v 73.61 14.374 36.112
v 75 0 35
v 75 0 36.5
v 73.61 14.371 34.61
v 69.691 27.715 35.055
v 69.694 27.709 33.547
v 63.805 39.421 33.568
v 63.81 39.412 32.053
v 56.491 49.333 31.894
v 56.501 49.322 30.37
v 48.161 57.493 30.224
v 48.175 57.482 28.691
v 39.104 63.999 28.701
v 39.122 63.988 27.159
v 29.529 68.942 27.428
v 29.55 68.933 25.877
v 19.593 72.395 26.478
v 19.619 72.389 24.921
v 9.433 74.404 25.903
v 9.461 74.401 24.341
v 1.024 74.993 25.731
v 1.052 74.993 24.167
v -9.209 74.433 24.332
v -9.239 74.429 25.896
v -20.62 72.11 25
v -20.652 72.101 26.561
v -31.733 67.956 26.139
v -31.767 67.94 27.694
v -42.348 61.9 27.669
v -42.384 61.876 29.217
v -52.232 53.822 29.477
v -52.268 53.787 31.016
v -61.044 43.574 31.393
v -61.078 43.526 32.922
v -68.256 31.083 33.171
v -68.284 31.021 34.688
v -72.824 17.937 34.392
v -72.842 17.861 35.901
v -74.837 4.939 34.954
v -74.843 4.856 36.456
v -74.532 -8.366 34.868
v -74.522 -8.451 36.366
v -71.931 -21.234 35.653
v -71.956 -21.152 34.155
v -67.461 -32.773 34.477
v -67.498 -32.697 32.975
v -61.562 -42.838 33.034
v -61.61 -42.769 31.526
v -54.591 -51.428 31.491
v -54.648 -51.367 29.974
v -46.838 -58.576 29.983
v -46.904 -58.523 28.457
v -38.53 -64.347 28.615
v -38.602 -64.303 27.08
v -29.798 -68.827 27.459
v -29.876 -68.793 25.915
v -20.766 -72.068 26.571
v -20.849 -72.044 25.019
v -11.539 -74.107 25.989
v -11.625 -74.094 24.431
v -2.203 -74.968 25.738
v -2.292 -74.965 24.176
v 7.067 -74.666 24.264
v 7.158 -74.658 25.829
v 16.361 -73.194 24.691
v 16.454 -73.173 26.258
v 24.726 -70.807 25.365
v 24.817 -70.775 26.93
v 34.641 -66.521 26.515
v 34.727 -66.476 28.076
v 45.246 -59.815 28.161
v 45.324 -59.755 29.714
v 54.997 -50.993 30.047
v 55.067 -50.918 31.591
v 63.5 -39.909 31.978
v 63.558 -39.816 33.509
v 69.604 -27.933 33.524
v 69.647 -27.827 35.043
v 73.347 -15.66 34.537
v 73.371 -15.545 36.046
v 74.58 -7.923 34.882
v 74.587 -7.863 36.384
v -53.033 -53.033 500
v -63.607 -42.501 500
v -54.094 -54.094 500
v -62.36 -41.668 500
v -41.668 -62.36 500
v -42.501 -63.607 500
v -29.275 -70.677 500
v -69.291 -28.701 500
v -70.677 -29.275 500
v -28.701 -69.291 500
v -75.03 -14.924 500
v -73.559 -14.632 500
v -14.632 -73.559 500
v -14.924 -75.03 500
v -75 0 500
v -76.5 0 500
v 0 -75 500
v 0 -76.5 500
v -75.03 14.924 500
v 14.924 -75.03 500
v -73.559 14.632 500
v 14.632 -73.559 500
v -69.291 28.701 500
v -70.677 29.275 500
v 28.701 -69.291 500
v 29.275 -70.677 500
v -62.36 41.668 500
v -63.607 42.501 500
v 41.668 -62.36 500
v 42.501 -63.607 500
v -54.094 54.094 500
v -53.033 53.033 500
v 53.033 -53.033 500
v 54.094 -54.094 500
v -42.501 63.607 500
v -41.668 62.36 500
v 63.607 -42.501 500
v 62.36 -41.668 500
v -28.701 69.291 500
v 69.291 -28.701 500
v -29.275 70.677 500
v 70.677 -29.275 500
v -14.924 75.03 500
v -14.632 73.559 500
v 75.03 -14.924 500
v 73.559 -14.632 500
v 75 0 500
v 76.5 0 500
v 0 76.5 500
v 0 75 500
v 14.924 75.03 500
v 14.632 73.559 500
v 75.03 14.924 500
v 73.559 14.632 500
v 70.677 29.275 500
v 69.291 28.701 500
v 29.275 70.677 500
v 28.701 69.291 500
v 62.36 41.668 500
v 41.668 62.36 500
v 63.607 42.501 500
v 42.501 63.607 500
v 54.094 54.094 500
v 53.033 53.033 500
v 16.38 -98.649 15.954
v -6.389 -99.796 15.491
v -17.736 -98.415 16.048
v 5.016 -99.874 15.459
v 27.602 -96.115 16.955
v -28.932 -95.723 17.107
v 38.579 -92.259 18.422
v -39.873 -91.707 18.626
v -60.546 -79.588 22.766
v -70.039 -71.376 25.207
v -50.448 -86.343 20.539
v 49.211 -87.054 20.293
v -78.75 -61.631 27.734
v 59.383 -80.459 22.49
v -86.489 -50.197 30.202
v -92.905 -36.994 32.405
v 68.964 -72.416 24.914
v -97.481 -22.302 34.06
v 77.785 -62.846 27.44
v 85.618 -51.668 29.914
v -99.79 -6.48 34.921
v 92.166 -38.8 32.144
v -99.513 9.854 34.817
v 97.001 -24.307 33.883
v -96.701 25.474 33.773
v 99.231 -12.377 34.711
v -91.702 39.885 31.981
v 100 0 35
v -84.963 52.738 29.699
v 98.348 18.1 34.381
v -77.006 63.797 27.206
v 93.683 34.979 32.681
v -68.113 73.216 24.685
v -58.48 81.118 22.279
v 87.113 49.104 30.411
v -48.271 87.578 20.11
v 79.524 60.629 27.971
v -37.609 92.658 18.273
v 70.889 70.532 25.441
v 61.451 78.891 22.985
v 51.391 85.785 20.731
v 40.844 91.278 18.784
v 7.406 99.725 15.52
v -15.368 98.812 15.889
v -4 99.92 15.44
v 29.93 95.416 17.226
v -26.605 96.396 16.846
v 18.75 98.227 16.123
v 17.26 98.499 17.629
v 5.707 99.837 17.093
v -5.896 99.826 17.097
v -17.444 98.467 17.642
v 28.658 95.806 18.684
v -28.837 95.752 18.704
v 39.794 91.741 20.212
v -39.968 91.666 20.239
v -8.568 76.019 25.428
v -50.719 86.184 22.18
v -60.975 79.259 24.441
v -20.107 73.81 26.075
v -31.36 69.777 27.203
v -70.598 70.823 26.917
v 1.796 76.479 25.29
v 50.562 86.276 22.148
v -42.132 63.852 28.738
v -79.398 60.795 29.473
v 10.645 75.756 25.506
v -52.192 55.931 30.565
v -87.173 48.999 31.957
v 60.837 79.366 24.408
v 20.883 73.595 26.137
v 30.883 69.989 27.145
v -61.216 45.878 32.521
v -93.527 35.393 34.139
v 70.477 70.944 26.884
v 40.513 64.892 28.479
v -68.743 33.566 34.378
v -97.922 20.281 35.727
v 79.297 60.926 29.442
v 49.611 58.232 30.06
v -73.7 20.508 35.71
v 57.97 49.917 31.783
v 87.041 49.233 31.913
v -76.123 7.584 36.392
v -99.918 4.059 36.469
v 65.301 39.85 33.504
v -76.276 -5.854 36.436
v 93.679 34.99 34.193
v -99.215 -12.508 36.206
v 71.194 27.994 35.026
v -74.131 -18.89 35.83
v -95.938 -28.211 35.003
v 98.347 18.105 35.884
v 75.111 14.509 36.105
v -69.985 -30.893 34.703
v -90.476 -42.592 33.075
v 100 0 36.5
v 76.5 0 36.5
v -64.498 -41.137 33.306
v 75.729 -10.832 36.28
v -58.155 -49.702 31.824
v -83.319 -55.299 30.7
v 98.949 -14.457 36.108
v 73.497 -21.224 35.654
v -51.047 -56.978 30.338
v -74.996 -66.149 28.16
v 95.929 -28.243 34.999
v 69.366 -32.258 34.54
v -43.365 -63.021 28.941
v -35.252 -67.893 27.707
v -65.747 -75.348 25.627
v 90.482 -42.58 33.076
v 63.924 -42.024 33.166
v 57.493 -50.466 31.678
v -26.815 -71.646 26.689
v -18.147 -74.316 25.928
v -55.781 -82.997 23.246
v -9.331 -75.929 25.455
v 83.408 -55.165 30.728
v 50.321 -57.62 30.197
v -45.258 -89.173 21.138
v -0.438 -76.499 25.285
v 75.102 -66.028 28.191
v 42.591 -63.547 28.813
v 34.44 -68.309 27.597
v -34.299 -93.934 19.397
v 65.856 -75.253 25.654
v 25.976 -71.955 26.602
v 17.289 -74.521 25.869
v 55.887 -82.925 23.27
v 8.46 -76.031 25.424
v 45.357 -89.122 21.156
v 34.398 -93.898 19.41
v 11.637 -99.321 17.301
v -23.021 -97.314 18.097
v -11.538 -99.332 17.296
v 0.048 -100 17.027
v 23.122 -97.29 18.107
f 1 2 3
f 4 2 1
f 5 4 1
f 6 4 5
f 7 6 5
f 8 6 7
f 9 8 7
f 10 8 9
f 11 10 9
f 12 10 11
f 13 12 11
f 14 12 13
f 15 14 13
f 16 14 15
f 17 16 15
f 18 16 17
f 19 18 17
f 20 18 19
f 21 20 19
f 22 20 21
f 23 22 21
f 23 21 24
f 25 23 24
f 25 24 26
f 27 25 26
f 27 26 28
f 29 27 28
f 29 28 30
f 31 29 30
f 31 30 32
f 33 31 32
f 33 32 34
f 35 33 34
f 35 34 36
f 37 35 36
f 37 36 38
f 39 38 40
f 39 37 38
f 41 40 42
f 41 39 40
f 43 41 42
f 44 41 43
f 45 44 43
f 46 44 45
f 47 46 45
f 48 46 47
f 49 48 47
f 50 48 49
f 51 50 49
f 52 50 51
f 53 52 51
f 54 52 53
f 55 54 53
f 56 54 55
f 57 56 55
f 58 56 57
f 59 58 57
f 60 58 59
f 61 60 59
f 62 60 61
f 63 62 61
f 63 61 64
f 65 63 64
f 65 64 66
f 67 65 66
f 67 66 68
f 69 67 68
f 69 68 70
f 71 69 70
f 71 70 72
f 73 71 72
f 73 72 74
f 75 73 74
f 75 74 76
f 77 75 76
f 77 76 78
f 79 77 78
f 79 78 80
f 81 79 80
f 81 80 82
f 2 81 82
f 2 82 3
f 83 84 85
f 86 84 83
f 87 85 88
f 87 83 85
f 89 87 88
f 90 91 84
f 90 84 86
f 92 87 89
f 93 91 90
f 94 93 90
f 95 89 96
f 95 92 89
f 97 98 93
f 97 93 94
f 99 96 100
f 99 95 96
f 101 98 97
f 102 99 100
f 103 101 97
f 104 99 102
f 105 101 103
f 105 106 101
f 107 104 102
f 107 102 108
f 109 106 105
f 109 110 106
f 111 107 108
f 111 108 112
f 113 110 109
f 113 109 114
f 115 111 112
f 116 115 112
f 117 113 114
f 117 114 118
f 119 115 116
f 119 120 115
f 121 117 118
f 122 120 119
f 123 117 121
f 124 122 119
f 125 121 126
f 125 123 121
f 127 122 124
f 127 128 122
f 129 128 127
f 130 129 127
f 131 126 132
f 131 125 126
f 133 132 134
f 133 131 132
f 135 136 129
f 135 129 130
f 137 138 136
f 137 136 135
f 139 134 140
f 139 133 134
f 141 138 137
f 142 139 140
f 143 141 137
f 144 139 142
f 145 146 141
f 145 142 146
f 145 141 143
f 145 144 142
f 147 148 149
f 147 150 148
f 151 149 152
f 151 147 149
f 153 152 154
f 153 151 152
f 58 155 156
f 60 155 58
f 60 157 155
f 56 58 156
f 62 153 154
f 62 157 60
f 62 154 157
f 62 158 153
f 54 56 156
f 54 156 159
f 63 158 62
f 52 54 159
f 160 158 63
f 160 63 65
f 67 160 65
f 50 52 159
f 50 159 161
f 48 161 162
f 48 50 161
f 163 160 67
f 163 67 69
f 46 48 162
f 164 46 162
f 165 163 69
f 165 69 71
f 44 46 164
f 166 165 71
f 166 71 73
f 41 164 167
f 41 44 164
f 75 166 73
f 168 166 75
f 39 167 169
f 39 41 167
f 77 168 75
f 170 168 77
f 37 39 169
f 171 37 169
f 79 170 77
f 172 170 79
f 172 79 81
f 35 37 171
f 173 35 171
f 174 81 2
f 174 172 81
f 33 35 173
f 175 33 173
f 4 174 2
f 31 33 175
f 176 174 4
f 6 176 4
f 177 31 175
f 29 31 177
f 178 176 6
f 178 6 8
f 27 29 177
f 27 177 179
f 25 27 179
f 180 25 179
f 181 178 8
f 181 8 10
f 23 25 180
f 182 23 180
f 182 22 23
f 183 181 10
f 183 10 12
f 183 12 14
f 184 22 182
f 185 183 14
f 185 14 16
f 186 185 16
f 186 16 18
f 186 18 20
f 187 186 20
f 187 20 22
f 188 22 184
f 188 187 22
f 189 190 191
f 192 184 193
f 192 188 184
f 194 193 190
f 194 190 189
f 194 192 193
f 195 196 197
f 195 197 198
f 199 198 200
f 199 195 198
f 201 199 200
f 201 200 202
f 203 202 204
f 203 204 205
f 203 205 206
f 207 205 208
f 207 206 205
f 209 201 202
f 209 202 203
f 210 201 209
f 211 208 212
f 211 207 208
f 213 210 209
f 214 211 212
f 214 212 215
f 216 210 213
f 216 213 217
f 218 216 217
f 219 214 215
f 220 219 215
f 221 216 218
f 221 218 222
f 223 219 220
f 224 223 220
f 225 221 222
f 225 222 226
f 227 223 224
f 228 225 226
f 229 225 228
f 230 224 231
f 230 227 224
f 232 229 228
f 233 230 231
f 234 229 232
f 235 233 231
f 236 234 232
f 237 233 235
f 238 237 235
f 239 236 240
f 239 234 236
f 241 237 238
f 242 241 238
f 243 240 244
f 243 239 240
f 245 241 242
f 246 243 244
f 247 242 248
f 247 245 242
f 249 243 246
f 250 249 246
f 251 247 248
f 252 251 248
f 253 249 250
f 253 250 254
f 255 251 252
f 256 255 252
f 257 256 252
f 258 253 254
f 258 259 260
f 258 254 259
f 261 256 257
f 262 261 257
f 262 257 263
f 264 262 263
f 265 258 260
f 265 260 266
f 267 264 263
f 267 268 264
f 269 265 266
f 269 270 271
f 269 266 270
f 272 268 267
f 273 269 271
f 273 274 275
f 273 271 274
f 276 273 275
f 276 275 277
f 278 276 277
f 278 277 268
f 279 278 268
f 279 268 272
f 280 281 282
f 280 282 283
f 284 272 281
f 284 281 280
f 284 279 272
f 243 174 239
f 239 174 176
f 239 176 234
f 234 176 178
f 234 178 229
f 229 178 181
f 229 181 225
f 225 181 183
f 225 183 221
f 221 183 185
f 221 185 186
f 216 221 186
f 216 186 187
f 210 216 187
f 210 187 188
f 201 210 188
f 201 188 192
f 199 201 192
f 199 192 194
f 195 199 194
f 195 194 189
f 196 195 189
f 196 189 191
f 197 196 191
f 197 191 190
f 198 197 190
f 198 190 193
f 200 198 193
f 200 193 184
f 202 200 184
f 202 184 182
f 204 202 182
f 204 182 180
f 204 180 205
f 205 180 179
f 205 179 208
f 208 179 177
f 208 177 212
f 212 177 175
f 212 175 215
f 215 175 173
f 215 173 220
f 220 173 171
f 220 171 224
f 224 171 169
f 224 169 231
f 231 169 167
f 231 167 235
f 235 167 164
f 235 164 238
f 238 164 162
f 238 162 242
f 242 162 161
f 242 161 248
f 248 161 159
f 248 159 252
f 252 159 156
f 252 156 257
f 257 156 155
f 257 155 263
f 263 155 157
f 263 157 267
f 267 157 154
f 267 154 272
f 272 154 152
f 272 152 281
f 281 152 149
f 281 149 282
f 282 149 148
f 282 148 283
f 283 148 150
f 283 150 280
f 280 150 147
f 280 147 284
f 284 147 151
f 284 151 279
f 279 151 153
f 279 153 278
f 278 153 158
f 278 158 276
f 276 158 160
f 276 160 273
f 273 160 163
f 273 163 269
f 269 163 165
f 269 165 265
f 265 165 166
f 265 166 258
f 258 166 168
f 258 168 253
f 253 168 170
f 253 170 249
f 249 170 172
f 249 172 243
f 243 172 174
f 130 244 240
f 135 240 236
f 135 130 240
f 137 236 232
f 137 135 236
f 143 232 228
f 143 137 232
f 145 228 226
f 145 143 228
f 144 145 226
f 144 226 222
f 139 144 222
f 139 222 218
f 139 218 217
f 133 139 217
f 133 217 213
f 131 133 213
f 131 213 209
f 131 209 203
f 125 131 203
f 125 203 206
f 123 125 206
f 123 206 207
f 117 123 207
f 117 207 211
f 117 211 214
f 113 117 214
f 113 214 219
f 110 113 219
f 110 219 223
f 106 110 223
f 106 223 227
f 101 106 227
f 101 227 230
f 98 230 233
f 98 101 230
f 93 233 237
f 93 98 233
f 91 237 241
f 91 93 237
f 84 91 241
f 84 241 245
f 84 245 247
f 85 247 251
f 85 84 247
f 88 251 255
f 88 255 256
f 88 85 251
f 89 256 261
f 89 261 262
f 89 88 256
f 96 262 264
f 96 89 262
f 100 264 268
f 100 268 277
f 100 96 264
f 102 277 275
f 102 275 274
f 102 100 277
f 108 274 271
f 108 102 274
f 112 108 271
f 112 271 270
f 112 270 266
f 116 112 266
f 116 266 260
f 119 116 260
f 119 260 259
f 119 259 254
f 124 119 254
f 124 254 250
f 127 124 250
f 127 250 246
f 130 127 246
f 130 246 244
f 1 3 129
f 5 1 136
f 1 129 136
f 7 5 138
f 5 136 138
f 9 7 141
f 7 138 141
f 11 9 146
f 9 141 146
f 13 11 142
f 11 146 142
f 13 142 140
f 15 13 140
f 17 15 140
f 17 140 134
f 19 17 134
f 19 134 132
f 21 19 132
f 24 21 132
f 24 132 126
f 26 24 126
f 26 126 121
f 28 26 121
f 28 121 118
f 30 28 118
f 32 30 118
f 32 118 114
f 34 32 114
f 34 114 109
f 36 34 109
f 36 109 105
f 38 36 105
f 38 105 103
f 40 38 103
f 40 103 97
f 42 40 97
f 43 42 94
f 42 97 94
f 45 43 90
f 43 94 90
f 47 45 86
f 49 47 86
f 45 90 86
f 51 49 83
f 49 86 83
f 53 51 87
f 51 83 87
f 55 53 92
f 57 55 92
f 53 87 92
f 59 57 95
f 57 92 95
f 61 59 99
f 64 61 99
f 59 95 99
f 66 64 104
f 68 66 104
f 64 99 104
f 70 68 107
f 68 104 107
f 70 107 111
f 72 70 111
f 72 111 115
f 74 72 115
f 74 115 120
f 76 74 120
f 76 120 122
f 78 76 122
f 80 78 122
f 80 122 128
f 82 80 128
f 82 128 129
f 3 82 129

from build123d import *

# Parameters (mm, degrees)
F1_DEPTH      = 125
F1_DEPTH_BACK = 125
F2_R          = 250
F2_R_2        = 100
F2_R_3        = 75
F3_DEPTH      = 36.501
F5_R          = 76.5
F5_R_2        = 75
F6_REACH      = 700.9678513202


with BuildPart() as f1:
    # F0 (on Right) → F1 (new body, two sides)
    with BuildSketch(Plane.YZ) as f1_sk:
        with BuildLine():
            ThreePointArc((-131.6244658109, 0), (0, 35), (131.6244658109, 0))
            Line((131.6244658109, 0), (134.6189065473, 0))
            ThreePointArc((134.6189065473, 0), (0, 36.5), (-134.6189065473, 0))
            Line((-134.6189065473, 0), (-131.6244658109, 0))
        make_face()
    extrude(amount=F1_DEPTH)
    extrude(f1_sk.sketch, amount=-F1_DEPTH_BACK)

    # F2 (on Top) → F3 (cut, through all)
    with BuildSketch(Plane.XY):
        Circle(F2_R)
        Circle(F2_R_2, mode=Mode.SUBTRACT)
        Circle(F2_R_3)
    extrude(amount=F3_DEPTH, mode=Mode.SUBTRACT)

    f6_end = f1.faces().sort_by_distance((-97.1648773409, 0, 36.5))[0]
    # F5 (on offset) → F6 (join, up to a face of the model that its end follows)
    with BuildSketch(Plane.XY.offset(500)):
        Circle(F5_R)
        Circle(F5_R_2, mode=Mode.SUBTRACT)
    f6_long = extrude(amount=-F6_REACH, mode=Mode.PRIVATE)
    add(split(f6_long, bisect_by=f6_end, keep=Keep.TOP, mode=Mode.PRIVATE))


solid = f1.part
